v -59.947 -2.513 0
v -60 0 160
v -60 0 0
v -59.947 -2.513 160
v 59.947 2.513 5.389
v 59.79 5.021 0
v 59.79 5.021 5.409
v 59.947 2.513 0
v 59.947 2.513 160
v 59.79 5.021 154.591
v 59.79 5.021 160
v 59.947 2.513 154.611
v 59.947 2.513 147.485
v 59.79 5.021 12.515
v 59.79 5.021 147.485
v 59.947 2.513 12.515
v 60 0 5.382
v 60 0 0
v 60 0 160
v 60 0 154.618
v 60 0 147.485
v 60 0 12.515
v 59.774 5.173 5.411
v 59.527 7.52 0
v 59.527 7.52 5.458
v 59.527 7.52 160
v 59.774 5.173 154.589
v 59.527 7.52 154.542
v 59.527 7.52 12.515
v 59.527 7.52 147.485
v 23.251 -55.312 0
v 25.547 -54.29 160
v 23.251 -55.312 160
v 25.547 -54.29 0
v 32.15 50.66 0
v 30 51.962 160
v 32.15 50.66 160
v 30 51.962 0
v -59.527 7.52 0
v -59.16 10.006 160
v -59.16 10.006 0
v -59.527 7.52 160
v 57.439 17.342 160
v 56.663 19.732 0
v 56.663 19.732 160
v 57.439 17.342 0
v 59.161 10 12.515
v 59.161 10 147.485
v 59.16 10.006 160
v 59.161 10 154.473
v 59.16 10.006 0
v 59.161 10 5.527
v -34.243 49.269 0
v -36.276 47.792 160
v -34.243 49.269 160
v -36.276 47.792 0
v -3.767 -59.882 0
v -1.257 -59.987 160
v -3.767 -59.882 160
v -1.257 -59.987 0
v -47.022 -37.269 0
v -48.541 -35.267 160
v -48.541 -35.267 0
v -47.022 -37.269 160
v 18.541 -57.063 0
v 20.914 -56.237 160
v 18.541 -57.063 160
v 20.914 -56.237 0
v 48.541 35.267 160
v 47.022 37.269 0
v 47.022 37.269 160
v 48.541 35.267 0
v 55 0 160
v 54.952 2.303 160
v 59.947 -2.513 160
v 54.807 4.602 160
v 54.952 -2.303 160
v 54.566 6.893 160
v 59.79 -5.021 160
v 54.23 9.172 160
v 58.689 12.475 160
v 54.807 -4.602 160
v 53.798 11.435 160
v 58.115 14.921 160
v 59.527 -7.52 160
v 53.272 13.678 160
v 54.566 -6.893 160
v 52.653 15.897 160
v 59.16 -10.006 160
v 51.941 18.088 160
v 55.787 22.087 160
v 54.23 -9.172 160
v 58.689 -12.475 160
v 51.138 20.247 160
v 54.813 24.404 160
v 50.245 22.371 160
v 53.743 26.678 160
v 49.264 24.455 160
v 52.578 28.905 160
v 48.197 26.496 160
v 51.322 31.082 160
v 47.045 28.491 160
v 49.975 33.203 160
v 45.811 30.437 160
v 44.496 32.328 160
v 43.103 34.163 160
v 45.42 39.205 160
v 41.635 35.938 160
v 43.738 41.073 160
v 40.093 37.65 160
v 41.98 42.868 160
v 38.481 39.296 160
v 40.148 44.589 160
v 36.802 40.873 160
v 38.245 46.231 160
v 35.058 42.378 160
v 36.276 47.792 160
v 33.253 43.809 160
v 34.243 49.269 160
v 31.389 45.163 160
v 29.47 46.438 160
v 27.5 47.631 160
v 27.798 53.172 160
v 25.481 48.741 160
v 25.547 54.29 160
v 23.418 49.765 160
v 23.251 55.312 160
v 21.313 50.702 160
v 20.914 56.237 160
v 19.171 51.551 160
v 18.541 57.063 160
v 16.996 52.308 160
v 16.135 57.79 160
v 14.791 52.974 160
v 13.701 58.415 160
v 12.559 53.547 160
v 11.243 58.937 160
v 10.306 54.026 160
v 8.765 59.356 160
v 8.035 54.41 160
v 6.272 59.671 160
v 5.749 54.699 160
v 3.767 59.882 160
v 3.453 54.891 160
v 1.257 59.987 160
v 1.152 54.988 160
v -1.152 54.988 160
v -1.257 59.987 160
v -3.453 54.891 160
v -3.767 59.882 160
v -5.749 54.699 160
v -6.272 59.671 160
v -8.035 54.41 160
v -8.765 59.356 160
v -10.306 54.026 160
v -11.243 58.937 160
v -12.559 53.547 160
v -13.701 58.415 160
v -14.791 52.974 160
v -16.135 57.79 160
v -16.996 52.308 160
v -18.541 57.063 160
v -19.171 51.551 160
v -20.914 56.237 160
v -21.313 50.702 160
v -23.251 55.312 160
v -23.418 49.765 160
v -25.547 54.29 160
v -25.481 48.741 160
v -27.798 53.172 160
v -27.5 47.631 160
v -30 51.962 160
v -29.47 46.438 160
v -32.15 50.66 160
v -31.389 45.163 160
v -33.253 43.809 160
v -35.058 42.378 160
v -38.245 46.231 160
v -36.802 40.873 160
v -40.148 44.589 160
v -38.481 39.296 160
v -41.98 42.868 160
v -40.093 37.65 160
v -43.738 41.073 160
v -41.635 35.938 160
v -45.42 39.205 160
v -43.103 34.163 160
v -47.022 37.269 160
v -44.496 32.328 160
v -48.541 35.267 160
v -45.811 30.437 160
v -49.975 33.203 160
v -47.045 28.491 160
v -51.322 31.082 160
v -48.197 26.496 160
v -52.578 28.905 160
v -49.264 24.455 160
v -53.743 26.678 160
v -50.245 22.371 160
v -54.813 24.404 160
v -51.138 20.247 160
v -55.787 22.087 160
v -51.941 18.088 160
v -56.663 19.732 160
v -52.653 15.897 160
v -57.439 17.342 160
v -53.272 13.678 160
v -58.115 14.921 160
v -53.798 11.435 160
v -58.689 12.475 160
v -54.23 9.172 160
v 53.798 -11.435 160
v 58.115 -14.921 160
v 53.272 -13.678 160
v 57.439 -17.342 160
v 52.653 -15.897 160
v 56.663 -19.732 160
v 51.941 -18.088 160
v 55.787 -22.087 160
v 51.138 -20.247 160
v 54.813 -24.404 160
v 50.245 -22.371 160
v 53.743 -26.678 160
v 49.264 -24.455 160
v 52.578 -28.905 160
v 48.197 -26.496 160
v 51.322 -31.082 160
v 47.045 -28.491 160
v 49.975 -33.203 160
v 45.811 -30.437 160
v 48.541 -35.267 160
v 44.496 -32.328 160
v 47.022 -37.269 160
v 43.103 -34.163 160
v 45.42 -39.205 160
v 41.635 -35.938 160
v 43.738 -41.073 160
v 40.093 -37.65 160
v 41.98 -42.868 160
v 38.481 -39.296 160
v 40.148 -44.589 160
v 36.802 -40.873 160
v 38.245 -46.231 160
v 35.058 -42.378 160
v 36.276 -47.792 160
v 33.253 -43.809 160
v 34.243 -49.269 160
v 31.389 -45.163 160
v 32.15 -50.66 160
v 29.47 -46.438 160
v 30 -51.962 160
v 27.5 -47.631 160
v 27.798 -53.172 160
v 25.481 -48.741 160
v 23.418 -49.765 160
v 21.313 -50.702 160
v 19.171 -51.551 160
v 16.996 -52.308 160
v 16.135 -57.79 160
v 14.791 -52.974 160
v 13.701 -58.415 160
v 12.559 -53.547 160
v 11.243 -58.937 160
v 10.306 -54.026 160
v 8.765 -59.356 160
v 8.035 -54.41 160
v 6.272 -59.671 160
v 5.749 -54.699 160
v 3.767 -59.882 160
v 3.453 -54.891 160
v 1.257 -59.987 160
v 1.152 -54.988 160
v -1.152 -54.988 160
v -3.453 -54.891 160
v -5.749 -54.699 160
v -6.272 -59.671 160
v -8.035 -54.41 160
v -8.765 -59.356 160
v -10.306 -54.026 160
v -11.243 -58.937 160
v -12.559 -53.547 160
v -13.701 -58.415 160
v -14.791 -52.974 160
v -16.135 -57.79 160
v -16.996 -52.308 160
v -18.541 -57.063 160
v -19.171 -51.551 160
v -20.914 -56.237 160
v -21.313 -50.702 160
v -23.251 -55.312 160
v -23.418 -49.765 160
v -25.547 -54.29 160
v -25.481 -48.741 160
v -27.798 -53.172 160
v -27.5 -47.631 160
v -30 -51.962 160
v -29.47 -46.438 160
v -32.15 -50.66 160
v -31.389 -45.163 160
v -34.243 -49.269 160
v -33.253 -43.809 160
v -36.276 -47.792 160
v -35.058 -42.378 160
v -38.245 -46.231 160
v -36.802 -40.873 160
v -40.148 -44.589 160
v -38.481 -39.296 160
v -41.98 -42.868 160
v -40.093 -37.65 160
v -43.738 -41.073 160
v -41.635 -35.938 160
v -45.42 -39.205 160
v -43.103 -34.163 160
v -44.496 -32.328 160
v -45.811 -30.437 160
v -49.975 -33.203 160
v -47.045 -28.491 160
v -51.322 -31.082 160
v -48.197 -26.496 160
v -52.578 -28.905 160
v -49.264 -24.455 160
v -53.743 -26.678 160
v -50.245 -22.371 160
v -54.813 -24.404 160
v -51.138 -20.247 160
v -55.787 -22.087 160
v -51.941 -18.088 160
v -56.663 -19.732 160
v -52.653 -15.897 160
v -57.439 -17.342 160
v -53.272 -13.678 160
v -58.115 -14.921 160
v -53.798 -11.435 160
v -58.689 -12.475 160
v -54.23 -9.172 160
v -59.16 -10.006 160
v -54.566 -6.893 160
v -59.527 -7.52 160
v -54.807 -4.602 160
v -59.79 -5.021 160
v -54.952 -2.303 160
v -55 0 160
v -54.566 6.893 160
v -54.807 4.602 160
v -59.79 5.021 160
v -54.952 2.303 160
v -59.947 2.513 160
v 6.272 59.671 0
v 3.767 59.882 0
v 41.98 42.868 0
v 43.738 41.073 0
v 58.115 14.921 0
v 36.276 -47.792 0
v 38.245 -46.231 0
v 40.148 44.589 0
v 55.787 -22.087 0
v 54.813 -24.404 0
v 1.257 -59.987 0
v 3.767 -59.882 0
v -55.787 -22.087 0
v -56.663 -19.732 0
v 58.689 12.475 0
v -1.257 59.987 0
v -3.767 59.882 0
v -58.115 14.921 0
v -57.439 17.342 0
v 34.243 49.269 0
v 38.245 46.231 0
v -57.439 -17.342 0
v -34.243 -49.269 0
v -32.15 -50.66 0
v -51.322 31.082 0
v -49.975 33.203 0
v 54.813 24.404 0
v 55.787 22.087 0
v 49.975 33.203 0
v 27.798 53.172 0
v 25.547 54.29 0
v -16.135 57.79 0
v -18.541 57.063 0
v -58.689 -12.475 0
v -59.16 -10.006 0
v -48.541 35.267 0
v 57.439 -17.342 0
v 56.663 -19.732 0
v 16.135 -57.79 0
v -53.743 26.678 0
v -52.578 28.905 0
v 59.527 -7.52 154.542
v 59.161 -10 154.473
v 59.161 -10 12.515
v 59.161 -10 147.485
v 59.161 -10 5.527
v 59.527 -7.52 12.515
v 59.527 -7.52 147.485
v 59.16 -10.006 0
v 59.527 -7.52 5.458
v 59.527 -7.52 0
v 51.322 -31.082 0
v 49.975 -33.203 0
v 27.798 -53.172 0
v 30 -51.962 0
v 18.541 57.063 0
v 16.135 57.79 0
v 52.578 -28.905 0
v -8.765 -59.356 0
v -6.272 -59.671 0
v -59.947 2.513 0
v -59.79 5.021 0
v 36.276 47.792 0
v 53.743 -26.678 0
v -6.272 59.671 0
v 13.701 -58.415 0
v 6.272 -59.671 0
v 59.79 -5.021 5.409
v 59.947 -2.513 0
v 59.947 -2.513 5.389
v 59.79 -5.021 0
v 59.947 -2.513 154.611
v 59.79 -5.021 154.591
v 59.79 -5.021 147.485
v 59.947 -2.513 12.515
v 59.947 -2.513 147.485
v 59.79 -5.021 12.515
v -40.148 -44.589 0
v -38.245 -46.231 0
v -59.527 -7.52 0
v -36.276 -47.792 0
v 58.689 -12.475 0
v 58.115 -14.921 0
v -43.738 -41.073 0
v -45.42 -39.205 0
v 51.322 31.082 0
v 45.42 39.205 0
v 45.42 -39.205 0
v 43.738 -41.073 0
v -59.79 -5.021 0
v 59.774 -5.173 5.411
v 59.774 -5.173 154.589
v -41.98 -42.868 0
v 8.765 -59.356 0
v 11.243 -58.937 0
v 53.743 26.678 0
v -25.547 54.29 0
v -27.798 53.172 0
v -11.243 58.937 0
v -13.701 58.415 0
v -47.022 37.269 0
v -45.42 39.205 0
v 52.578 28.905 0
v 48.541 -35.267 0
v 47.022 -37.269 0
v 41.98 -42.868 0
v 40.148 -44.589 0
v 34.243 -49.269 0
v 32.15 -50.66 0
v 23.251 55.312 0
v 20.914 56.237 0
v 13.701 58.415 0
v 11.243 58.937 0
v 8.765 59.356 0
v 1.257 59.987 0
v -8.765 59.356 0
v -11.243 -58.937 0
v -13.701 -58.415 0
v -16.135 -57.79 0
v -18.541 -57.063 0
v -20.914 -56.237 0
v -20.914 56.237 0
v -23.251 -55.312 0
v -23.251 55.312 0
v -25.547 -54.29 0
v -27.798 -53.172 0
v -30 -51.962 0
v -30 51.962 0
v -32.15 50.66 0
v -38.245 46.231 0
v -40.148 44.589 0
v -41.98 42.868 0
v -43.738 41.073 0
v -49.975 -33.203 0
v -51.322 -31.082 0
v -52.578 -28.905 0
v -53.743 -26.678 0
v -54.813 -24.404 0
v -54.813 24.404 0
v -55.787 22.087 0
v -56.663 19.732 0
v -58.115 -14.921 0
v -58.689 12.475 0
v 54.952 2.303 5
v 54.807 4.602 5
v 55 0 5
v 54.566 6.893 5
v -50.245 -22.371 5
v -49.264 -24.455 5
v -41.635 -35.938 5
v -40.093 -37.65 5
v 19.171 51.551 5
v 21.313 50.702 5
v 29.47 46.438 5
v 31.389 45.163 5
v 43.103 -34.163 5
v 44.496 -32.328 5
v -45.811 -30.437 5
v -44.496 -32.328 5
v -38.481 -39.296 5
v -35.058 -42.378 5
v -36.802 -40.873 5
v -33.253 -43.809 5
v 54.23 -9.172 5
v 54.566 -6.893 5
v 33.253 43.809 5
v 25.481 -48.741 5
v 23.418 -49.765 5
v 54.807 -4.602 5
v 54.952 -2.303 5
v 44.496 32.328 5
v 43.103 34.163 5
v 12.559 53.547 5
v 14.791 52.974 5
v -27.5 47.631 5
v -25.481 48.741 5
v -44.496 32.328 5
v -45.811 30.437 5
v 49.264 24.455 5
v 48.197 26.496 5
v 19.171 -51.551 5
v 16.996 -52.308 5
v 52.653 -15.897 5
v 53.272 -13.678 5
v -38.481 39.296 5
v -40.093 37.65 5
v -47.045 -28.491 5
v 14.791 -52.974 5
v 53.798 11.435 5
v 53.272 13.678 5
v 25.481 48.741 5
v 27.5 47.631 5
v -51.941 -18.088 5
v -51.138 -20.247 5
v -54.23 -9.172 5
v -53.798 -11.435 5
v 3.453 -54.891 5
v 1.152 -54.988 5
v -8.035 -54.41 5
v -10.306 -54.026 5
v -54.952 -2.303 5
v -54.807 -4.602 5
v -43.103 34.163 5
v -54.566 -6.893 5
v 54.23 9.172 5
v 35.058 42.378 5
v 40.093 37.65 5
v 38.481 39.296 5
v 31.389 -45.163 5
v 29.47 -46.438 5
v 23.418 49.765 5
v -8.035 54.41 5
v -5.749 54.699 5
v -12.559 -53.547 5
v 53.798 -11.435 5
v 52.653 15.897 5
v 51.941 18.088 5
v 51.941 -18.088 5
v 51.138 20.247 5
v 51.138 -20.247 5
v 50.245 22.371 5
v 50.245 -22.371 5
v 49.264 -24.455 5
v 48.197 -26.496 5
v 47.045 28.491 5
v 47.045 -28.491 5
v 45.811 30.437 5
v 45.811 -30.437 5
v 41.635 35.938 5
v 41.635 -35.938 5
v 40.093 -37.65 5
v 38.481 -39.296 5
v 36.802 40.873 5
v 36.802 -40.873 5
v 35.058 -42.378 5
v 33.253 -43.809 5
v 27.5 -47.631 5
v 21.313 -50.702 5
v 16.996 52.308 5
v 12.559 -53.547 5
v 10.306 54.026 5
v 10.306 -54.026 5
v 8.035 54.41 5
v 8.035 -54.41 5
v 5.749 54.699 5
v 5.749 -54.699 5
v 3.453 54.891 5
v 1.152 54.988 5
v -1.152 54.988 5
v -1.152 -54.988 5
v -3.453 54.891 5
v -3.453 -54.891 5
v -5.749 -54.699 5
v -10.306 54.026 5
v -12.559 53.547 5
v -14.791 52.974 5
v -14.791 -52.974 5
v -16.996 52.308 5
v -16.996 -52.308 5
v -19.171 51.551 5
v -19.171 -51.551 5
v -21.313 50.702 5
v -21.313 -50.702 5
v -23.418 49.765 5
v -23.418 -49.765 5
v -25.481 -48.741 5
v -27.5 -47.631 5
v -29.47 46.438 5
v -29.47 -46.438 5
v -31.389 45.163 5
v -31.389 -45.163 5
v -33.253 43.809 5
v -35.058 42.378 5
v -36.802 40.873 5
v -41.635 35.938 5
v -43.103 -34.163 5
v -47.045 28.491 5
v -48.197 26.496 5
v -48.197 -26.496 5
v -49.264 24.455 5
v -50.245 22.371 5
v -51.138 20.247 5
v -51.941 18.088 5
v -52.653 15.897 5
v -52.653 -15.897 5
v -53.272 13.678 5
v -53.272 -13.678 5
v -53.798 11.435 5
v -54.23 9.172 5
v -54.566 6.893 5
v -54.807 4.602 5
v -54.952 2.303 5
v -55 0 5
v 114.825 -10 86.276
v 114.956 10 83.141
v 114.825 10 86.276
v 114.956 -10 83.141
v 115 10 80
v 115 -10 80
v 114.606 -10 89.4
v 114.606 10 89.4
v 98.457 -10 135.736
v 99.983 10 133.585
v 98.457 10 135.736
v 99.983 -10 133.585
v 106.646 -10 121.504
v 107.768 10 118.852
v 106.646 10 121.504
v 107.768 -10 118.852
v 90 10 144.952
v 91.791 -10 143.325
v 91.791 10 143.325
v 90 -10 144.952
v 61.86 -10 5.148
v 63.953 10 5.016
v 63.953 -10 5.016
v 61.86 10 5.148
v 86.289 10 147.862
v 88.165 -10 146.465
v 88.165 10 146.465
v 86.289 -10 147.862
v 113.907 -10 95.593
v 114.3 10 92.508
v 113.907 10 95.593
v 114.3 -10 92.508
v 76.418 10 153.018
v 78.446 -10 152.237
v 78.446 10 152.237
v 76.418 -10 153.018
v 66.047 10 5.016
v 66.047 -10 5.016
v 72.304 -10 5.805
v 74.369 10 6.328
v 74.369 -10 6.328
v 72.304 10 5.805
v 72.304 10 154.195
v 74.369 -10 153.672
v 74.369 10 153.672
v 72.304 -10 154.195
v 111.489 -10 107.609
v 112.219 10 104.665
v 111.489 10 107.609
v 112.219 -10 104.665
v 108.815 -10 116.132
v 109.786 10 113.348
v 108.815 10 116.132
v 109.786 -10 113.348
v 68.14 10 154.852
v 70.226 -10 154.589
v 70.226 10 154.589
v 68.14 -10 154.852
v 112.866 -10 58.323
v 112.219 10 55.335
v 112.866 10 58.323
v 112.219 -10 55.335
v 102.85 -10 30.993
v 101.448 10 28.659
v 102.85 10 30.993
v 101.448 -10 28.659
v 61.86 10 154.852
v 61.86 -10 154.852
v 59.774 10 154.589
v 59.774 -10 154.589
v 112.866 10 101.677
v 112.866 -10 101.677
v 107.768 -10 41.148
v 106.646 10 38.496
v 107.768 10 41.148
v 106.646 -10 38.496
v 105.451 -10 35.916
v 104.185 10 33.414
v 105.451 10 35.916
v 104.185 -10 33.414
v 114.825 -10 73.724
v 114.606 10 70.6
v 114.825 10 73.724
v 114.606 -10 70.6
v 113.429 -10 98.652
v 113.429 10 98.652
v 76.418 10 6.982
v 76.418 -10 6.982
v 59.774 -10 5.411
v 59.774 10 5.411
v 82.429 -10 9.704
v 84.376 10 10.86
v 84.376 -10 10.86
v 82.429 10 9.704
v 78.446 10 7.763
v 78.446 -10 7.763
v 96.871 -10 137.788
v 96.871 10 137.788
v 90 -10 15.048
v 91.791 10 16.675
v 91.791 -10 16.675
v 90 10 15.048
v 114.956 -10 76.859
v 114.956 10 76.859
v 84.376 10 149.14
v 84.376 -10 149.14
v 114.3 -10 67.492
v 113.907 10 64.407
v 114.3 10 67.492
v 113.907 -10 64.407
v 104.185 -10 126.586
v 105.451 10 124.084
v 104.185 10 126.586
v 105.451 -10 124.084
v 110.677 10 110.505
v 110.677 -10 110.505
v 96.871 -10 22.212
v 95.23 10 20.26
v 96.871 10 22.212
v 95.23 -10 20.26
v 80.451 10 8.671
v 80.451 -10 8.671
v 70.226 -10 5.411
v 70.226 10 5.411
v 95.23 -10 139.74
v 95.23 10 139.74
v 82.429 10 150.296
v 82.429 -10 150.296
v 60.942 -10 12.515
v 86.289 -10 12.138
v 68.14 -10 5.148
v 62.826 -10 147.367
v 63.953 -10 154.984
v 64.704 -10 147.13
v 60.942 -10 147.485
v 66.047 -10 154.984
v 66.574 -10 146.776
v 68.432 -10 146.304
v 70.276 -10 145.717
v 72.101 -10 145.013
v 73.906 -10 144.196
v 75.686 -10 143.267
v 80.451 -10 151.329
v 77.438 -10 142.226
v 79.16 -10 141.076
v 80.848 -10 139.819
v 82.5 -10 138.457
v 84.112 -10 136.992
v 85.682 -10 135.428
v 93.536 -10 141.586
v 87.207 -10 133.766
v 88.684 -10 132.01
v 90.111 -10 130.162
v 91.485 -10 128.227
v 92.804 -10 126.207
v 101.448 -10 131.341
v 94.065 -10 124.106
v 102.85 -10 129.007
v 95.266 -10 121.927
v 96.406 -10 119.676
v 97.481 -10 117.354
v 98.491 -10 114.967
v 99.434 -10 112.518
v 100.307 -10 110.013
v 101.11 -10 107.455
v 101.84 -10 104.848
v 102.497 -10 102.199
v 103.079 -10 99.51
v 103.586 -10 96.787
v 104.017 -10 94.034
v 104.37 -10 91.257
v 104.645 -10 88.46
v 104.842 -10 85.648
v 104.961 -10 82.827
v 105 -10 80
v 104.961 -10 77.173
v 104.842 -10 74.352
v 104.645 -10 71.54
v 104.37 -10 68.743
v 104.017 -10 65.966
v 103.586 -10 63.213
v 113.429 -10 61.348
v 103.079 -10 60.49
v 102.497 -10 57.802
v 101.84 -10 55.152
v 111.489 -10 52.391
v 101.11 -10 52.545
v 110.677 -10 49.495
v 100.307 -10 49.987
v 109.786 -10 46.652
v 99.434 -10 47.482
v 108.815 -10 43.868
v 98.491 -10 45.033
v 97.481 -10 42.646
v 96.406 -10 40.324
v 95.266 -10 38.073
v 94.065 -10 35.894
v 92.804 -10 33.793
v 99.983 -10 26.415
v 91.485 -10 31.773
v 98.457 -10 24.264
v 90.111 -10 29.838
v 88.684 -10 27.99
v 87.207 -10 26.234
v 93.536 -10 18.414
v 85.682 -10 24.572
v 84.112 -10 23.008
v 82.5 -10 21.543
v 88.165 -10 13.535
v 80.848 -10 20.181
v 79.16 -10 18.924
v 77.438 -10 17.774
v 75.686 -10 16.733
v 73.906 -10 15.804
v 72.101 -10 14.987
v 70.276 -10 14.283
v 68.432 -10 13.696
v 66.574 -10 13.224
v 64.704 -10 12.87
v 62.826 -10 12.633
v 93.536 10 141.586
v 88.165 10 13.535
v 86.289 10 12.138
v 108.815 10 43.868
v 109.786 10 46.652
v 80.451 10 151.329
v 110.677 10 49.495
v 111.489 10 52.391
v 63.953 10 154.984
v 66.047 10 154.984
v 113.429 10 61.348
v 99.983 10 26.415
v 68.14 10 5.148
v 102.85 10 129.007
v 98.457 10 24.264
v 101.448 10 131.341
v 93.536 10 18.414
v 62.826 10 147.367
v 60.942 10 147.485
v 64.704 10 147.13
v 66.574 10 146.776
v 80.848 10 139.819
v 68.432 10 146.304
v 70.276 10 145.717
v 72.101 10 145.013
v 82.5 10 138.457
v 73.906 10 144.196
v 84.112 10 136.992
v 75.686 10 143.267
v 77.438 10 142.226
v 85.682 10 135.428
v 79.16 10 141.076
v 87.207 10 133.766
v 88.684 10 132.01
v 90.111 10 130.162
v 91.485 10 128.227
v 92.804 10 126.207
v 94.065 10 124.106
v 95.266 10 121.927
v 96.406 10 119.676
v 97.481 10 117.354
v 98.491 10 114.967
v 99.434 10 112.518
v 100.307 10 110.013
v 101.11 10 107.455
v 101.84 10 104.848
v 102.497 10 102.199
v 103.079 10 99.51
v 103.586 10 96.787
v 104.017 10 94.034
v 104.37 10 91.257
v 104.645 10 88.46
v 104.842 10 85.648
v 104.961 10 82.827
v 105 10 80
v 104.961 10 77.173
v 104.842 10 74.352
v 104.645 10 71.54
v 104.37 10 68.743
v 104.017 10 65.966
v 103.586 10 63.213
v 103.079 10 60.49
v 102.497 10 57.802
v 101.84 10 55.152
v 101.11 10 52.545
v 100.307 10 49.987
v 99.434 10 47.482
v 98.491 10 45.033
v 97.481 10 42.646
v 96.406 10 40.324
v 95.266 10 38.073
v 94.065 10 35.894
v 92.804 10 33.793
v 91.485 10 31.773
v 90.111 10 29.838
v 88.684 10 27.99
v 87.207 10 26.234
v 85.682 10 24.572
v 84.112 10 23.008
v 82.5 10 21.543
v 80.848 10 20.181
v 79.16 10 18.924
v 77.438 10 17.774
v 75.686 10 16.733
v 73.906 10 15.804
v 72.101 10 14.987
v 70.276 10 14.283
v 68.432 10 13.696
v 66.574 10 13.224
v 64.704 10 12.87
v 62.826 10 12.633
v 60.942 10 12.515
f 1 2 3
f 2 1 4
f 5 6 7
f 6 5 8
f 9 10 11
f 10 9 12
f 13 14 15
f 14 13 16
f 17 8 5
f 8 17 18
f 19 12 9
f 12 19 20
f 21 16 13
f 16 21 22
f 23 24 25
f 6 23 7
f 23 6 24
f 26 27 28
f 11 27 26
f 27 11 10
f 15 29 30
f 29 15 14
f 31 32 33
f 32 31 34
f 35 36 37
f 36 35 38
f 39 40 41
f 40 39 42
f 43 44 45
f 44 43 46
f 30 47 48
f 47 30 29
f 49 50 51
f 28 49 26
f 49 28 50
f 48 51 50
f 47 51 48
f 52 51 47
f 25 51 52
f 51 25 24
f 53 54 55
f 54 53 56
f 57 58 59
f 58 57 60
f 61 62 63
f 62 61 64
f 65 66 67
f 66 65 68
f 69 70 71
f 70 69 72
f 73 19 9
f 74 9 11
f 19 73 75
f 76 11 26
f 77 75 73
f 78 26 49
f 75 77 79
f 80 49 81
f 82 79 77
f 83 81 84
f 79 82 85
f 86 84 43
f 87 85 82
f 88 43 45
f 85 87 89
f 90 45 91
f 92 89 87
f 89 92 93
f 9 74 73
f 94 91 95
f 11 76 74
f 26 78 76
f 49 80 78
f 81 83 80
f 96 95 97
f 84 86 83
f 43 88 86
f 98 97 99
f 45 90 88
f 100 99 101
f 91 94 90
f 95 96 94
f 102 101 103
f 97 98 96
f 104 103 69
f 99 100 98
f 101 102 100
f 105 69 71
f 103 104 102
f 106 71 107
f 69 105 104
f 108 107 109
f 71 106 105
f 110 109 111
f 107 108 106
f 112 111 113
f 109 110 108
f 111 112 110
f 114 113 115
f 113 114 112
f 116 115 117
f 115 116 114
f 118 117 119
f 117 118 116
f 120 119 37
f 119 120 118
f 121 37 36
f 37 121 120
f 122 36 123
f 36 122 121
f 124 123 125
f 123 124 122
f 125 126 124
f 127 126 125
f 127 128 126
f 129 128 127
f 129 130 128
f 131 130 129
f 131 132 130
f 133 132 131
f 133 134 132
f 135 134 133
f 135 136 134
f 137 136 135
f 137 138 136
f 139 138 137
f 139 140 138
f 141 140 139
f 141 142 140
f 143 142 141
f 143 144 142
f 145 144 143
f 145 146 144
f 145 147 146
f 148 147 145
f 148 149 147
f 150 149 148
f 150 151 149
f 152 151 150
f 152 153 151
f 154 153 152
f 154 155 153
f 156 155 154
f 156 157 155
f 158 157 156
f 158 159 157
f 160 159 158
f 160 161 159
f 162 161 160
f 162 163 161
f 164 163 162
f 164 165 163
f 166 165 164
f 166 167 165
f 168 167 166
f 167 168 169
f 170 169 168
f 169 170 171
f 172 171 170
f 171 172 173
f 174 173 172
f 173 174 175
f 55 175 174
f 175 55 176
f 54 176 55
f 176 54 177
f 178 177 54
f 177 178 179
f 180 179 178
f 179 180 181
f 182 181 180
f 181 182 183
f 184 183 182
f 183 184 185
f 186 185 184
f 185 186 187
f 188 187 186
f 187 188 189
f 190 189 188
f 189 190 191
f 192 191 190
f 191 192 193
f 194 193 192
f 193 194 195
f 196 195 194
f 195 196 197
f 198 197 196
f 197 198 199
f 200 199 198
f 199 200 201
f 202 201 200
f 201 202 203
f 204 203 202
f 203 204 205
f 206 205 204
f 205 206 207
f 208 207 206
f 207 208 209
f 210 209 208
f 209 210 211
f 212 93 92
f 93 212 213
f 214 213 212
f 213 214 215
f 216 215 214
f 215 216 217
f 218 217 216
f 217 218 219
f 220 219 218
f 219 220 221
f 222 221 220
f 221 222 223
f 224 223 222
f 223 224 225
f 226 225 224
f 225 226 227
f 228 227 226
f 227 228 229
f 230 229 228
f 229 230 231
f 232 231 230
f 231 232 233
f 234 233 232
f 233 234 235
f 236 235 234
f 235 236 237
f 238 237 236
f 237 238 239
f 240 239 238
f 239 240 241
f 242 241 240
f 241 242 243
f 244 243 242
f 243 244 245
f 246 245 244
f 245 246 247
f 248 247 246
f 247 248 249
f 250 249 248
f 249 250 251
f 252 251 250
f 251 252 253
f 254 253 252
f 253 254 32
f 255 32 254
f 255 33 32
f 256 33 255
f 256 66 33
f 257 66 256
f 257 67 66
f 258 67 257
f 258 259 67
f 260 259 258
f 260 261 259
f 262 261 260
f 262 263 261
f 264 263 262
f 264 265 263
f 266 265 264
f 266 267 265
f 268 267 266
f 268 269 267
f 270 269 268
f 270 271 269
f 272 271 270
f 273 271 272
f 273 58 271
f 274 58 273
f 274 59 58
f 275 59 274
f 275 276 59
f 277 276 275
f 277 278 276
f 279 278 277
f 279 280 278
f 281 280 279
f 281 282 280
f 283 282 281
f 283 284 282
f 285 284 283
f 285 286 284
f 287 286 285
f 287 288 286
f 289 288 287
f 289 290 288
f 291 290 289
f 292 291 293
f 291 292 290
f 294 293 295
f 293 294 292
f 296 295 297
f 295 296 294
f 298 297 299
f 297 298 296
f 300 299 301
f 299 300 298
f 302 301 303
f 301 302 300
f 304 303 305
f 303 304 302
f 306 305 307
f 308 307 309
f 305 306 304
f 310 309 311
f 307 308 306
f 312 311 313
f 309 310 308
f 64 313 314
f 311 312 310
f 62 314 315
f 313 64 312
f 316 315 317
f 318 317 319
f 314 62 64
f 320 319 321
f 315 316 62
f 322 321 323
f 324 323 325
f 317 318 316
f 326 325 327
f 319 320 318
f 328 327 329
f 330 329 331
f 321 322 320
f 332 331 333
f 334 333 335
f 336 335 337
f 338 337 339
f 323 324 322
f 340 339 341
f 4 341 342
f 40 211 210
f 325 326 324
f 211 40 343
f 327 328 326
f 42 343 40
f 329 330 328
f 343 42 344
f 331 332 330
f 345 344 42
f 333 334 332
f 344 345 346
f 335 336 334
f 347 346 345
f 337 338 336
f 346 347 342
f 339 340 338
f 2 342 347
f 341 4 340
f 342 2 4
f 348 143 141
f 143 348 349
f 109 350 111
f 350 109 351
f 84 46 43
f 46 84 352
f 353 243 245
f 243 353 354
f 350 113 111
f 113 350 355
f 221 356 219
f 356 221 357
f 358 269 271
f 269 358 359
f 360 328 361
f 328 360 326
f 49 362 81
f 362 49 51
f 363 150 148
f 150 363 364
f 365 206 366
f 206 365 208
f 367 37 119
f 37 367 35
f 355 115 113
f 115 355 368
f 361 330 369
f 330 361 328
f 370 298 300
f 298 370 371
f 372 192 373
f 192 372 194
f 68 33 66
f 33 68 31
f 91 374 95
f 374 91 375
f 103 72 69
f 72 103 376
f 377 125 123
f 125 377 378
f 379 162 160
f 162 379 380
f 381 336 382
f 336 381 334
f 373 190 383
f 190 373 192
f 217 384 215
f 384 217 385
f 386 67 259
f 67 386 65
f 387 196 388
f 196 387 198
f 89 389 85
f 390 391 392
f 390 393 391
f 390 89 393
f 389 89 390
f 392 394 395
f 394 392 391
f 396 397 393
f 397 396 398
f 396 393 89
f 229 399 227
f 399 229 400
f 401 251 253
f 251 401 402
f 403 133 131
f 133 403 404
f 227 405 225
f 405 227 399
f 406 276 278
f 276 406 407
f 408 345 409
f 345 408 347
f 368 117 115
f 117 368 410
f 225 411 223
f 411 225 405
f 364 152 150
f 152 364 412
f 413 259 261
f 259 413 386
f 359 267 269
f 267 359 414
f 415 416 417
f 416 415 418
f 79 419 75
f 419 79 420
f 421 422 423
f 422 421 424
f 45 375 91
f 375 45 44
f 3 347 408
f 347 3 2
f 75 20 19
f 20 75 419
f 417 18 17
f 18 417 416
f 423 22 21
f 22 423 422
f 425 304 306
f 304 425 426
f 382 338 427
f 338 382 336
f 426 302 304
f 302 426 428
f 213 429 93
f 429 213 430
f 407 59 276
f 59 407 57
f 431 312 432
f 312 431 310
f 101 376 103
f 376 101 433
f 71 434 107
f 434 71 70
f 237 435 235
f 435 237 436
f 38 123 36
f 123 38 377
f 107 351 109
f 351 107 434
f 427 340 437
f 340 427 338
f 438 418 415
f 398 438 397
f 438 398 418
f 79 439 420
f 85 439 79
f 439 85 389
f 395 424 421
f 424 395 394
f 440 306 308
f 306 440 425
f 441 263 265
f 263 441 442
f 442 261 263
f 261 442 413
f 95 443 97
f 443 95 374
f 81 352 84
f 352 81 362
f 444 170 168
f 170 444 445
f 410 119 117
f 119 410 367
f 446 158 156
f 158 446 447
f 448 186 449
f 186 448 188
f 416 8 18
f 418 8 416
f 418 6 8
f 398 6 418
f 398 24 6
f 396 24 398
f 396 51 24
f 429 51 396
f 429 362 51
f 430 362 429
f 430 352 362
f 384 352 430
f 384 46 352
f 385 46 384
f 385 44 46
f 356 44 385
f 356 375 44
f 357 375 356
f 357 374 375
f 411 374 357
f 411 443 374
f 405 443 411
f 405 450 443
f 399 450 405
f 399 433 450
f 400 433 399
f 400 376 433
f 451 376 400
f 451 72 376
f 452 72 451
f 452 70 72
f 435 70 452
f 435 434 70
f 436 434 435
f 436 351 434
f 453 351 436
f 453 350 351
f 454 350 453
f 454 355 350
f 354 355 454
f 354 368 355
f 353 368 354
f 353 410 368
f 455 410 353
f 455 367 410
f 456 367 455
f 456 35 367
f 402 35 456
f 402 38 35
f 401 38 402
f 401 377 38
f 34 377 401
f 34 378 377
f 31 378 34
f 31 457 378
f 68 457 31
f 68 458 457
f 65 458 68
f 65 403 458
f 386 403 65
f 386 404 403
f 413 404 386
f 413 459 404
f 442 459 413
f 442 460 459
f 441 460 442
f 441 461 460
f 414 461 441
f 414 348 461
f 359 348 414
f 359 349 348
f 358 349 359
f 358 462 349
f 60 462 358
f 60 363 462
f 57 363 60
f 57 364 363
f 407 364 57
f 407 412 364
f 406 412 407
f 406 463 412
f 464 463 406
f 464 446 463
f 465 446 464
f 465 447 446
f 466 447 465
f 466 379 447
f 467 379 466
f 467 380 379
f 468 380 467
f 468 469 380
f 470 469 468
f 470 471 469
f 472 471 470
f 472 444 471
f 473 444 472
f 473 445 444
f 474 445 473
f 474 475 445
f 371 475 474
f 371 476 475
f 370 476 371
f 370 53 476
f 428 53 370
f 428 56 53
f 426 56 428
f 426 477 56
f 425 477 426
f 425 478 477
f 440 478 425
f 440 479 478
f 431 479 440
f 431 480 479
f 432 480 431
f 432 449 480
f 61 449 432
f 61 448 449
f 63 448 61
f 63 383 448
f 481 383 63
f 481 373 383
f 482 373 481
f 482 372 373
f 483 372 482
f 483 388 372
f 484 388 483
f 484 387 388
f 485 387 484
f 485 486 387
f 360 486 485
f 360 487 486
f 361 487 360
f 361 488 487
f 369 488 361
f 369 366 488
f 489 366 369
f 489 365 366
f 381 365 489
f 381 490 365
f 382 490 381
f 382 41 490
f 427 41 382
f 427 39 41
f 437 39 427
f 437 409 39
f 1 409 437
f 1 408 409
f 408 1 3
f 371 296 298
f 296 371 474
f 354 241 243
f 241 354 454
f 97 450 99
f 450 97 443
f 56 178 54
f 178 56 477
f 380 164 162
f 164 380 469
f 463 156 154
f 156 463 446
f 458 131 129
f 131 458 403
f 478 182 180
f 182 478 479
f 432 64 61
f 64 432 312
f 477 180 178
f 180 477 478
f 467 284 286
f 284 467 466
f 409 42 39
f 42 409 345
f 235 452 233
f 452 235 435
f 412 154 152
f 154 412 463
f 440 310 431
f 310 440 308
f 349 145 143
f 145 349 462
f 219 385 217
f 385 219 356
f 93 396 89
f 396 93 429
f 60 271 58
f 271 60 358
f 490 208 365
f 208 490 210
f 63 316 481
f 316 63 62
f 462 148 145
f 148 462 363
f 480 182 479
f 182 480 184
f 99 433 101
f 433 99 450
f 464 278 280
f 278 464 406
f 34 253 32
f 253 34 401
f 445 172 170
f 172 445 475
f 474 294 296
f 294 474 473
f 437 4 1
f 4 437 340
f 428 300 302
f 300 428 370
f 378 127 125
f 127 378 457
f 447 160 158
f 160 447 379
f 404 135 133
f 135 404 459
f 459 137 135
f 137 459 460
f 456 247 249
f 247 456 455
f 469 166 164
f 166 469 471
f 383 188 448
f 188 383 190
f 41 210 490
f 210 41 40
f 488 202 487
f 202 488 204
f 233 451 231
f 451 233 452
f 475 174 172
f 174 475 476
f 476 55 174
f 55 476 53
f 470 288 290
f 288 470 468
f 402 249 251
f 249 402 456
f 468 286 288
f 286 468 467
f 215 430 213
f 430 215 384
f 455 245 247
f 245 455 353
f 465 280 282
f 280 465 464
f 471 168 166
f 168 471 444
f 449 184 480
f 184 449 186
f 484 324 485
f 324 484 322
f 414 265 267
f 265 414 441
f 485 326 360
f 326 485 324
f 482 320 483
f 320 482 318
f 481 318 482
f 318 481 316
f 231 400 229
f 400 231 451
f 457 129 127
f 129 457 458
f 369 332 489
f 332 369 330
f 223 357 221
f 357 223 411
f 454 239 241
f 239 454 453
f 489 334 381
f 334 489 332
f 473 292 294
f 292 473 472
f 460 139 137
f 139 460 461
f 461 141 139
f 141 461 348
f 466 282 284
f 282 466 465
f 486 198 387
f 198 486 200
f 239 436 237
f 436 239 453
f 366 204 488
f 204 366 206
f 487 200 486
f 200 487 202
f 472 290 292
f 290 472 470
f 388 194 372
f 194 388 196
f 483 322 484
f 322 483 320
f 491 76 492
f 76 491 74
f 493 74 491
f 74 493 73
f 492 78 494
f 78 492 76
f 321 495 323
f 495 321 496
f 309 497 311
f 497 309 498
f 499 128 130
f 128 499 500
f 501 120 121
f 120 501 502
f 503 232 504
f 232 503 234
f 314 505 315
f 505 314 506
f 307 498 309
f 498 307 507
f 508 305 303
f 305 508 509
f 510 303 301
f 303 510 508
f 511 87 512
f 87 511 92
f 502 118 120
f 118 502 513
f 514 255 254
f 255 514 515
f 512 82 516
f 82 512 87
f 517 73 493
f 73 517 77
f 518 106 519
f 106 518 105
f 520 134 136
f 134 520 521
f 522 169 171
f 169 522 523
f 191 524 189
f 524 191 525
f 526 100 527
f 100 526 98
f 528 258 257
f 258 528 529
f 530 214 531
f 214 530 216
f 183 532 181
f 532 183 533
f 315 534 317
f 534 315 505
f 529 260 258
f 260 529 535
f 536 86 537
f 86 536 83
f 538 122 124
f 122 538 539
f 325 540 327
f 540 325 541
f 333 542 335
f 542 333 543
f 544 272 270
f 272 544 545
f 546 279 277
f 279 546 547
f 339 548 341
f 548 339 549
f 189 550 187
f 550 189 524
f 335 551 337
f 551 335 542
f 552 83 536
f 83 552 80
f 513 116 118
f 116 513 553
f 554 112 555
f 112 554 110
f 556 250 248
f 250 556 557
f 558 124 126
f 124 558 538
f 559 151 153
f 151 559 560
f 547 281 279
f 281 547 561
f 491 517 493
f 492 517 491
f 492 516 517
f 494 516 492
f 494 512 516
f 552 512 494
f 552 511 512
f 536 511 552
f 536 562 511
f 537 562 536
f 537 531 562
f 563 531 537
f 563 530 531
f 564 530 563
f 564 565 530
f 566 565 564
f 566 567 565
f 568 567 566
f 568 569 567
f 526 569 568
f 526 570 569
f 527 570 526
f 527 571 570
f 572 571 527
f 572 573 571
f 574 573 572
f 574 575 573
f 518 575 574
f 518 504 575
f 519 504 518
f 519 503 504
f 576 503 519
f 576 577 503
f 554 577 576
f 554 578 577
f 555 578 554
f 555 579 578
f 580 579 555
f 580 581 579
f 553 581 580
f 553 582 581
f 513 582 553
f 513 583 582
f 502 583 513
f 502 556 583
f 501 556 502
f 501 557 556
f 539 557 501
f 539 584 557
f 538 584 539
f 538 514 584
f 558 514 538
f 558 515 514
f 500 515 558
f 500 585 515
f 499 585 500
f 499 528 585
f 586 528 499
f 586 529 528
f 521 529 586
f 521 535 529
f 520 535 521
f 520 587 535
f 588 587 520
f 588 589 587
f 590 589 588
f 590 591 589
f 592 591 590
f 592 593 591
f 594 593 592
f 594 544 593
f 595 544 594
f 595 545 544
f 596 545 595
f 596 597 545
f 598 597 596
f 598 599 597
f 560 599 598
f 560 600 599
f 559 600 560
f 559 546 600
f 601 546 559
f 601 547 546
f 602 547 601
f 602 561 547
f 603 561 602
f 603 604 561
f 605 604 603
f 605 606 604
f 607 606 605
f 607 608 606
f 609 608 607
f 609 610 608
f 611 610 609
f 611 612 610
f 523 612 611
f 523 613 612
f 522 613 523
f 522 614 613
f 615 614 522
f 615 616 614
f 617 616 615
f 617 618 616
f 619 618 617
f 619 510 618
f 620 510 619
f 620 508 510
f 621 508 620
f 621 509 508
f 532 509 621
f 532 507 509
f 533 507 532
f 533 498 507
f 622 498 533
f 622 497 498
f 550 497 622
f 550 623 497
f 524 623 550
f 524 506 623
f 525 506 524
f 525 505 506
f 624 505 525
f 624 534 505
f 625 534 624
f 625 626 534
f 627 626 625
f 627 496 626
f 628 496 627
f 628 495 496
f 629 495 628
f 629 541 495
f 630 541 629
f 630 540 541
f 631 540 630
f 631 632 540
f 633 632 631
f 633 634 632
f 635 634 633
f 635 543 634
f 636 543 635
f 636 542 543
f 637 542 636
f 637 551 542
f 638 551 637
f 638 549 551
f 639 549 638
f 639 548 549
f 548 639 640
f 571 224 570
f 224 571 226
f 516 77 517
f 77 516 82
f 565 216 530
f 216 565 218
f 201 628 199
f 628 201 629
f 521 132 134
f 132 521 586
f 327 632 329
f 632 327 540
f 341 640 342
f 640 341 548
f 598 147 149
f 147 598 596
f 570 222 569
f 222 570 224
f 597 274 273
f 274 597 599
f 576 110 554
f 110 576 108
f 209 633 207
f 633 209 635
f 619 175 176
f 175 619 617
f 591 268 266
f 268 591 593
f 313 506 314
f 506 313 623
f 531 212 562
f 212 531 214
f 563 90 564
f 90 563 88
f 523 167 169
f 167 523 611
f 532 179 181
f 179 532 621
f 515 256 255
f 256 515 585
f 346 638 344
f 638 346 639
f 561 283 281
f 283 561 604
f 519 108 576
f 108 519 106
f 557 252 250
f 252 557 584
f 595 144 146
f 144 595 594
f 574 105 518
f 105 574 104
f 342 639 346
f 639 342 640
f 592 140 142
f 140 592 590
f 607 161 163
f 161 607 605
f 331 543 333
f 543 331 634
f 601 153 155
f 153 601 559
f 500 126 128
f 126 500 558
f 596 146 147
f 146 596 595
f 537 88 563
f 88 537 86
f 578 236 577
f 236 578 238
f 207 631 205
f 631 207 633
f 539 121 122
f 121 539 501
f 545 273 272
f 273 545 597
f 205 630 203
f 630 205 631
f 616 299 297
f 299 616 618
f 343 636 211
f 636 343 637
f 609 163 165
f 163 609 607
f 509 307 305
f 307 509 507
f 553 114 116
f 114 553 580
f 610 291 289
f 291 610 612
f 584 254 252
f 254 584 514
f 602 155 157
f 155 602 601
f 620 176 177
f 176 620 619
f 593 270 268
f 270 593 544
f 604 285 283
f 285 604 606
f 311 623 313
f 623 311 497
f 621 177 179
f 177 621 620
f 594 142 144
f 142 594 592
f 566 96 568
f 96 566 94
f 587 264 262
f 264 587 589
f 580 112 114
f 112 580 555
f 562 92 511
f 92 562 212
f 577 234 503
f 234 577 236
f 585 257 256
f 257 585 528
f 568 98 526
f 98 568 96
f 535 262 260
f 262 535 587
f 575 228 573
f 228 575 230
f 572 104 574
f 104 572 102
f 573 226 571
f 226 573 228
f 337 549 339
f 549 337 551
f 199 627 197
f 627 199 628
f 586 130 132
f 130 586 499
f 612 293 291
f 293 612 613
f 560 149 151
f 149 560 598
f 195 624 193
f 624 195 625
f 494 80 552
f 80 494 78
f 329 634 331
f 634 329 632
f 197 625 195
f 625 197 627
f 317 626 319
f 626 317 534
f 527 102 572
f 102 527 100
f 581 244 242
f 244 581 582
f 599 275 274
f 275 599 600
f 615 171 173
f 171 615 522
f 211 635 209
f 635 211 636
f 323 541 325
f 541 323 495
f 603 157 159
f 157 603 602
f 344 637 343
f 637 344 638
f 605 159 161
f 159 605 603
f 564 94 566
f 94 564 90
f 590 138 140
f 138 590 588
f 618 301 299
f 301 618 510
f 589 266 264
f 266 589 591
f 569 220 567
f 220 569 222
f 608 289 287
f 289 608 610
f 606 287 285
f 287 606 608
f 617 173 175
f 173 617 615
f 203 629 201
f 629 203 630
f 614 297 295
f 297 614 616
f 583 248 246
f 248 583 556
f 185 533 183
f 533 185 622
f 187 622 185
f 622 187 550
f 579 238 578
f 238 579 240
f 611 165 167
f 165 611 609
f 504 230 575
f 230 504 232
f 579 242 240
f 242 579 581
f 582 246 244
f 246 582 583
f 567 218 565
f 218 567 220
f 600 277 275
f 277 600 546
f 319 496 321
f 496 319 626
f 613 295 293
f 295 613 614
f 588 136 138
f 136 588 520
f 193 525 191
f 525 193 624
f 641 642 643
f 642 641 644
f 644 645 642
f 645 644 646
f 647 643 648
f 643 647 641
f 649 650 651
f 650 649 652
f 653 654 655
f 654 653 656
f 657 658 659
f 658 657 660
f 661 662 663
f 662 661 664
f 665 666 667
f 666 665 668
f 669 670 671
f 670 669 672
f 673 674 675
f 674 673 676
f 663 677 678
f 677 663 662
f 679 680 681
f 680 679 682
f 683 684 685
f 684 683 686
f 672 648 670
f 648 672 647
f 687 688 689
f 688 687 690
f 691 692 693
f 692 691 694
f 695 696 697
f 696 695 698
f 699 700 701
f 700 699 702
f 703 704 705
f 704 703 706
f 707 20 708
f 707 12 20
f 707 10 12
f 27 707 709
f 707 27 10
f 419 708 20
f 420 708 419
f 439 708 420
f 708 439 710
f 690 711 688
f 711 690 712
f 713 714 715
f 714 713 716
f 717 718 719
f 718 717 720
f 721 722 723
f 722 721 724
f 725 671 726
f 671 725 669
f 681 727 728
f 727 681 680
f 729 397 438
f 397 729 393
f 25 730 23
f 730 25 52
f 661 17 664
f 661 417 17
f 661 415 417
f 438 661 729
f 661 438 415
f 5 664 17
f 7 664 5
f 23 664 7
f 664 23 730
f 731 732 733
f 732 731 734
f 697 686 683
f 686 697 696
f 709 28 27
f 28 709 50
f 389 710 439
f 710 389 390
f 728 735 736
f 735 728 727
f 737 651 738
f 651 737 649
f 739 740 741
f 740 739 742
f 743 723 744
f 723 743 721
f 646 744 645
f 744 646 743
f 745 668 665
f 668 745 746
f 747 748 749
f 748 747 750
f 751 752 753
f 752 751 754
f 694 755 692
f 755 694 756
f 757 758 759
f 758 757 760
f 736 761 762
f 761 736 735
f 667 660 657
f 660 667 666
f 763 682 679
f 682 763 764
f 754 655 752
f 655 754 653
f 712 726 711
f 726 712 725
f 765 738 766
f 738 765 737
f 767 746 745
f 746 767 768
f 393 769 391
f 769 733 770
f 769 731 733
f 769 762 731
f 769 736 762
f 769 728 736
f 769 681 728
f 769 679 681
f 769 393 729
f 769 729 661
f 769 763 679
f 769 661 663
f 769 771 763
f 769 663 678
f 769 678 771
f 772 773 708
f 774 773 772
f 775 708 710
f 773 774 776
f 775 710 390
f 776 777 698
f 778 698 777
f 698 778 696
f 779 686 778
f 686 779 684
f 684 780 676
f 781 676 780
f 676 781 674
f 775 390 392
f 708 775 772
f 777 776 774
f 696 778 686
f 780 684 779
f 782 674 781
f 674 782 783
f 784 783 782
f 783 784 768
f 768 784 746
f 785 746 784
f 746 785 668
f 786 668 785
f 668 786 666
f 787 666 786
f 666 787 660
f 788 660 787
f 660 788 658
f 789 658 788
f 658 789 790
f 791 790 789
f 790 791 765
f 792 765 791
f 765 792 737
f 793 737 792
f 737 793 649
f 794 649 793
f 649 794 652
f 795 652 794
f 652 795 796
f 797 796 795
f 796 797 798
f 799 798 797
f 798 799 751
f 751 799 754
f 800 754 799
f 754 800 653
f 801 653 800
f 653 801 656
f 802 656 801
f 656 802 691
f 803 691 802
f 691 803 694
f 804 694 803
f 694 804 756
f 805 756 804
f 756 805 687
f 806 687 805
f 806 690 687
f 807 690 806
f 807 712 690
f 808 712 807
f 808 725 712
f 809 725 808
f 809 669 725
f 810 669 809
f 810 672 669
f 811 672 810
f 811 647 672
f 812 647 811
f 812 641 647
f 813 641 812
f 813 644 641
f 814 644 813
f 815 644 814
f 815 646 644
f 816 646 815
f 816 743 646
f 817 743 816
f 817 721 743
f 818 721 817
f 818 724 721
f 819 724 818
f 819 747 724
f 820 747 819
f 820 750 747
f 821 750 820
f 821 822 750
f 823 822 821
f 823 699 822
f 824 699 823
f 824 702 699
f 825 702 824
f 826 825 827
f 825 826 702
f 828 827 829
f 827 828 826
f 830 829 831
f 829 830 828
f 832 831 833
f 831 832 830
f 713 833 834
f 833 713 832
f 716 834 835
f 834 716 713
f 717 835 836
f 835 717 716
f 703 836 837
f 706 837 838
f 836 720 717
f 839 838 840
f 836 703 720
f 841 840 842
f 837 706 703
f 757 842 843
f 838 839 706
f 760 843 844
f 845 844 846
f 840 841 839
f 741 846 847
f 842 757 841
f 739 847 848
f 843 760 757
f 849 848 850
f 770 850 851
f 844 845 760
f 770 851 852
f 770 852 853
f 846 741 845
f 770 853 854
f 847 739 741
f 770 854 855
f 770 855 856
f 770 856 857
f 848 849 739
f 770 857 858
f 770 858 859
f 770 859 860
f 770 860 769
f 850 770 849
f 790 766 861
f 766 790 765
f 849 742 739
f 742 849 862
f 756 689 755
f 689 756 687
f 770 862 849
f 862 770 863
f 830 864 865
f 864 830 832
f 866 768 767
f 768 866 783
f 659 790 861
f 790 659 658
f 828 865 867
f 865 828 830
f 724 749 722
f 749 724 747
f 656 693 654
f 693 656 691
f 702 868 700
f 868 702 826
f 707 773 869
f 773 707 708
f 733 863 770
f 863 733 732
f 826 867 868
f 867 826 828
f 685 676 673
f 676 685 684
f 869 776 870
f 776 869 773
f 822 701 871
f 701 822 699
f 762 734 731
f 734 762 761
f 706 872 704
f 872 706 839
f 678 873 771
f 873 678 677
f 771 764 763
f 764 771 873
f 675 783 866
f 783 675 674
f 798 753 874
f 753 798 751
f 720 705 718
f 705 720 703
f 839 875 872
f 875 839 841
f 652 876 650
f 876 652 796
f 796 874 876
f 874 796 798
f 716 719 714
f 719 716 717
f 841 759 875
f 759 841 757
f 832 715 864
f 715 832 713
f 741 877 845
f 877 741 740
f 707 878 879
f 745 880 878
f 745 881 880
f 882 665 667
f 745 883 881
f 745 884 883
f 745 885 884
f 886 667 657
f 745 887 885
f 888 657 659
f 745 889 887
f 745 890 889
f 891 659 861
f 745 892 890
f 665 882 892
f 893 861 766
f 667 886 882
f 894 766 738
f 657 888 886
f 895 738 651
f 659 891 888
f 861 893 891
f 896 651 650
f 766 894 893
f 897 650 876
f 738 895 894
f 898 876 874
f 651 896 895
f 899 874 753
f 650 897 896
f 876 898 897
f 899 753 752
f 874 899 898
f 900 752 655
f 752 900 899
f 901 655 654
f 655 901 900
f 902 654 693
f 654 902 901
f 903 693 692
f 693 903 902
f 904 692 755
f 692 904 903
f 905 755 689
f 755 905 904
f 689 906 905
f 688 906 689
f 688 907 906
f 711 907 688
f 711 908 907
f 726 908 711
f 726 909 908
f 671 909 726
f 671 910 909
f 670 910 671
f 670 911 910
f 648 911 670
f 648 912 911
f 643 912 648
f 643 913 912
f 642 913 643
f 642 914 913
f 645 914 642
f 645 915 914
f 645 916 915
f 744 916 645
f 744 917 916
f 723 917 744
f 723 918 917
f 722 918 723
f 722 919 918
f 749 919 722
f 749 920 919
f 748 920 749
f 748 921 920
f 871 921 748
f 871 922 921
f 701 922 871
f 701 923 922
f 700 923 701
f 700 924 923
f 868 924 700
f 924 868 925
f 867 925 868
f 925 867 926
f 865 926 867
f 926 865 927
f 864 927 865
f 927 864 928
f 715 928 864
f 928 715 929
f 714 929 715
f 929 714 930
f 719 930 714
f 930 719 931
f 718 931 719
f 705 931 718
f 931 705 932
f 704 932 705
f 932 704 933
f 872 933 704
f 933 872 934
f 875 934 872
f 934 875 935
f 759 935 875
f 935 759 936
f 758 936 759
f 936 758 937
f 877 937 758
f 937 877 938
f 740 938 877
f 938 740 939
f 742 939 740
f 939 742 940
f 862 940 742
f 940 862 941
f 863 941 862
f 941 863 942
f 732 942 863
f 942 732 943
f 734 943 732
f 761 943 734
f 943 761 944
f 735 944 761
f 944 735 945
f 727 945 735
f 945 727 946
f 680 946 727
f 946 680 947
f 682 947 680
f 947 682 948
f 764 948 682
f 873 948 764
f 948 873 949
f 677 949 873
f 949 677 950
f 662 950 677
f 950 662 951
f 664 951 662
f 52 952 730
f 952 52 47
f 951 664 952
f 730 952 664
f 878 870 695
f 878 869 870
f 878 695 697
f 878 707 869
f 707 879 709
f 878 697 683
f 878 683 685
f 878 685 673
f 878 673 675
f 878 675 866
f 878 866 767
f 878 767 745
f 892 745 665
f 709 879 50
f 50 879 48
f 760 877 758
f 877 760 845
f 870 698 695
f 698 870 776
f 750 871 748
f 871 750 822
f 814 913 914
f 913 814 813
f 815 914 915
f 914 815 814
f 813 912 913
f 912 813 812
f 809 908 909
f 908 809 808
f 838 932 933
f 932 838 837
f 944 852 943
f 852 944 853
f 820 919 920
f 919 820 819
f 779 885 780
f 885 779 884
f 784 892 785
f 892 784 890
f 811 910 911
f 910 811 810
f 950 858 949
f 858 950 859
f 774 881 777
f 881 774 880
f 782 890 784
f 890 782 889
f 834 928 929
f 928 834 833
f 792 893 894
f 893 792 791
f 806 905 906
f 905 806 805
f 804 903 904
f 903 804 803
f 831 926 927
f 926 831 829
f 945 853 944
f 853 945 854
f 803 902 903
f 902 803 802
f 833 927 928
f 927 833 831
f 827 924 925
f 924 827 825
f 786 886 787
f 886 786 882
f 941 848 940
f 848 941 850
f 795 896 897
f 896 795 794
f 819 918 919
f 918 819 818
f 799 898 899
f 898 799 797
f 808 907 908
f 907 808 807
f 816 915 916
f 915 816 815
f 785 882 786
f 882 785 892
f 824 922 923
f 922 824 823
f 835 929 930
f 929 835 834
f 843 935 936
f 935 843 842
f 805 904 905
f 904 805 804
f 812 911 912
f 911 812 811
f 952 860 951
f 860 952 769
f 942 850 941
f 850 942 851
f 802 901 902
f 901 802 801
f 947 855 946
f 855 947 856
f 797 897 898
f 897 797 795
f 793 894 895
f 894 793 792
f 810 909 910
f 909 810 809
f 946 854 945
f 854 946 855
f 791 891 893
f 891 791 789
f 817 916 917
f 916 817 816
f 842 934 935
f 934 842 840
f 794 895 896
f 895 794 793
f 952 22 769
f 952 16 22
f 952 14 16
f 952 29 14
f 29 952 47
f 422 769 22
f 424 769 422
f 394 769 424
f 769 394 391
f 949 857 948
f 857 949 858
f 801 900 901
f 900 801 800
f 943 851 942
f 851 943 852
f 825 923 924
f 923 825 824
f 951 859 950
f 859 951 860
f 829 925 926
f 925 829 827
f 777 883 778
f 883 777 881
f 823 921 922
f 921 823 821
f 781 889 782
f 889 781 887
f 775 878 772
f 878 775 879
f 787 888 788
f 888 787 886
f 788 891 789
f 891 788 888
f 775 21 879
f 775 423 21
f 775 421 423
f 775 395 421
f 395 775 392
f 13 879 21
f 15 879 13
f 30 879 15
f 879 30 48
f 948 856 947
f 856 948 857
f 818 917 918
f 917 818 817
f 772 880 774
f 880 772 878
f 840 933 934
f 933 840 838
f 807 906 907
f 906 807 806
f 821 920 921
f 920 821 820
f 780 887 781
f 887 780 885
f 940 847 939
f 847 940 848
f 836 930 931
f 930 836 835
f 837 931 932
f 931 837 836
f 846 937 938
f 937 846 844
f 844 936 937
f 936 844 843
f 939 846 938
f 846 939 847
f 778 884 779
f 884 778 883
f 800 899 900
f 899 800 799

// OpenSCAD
//////////////////////////////////////////////////////////////////////////////////////Open SCAD///////////////////////////
/*///////////////////////////////////////////////////////////

date started:	6/10/2013	
date finished:	
modeler:			Patrick Conner
copyright:		N/A

*/


//////////////////////////////////////////////////////////////////////////////////////////parameters///////////////////////////////////////////////////////////////////////////////////

$fn=150;


////////////////////////////////////////////////////////////////////////////////////////////renders////////////////////////////////////////////////////////////////////////////////////

module mug(){
	cup(height=160,diameter=120);
	translate([120/2-5,10,80])
		rotate([90,0,0])
			handle();
}

mug();

/////////////////////////////////////////////////////////////////////////////////////////////modules///////////////////////////////////////////////////////////////////////////////////

module handle(){
	translate([10,0,0]){
		difference(){
			scale([1,1.5,1])
				cylinder(20,50,50);
			translate([-5,0,-5])
				scale([1,1.5,1])
					cylinder(30,45,45);
			translate([-70,-80,-5])
				cube([60,160,30]);
		}
	}
}

module cup(height,diameter){
	difference(){
		cylinder(height,diameter/2,diameter/2);
		translate([0,0,5])
			cylinder(height,diameter/2-5,diameter/2-5);
	}
}
